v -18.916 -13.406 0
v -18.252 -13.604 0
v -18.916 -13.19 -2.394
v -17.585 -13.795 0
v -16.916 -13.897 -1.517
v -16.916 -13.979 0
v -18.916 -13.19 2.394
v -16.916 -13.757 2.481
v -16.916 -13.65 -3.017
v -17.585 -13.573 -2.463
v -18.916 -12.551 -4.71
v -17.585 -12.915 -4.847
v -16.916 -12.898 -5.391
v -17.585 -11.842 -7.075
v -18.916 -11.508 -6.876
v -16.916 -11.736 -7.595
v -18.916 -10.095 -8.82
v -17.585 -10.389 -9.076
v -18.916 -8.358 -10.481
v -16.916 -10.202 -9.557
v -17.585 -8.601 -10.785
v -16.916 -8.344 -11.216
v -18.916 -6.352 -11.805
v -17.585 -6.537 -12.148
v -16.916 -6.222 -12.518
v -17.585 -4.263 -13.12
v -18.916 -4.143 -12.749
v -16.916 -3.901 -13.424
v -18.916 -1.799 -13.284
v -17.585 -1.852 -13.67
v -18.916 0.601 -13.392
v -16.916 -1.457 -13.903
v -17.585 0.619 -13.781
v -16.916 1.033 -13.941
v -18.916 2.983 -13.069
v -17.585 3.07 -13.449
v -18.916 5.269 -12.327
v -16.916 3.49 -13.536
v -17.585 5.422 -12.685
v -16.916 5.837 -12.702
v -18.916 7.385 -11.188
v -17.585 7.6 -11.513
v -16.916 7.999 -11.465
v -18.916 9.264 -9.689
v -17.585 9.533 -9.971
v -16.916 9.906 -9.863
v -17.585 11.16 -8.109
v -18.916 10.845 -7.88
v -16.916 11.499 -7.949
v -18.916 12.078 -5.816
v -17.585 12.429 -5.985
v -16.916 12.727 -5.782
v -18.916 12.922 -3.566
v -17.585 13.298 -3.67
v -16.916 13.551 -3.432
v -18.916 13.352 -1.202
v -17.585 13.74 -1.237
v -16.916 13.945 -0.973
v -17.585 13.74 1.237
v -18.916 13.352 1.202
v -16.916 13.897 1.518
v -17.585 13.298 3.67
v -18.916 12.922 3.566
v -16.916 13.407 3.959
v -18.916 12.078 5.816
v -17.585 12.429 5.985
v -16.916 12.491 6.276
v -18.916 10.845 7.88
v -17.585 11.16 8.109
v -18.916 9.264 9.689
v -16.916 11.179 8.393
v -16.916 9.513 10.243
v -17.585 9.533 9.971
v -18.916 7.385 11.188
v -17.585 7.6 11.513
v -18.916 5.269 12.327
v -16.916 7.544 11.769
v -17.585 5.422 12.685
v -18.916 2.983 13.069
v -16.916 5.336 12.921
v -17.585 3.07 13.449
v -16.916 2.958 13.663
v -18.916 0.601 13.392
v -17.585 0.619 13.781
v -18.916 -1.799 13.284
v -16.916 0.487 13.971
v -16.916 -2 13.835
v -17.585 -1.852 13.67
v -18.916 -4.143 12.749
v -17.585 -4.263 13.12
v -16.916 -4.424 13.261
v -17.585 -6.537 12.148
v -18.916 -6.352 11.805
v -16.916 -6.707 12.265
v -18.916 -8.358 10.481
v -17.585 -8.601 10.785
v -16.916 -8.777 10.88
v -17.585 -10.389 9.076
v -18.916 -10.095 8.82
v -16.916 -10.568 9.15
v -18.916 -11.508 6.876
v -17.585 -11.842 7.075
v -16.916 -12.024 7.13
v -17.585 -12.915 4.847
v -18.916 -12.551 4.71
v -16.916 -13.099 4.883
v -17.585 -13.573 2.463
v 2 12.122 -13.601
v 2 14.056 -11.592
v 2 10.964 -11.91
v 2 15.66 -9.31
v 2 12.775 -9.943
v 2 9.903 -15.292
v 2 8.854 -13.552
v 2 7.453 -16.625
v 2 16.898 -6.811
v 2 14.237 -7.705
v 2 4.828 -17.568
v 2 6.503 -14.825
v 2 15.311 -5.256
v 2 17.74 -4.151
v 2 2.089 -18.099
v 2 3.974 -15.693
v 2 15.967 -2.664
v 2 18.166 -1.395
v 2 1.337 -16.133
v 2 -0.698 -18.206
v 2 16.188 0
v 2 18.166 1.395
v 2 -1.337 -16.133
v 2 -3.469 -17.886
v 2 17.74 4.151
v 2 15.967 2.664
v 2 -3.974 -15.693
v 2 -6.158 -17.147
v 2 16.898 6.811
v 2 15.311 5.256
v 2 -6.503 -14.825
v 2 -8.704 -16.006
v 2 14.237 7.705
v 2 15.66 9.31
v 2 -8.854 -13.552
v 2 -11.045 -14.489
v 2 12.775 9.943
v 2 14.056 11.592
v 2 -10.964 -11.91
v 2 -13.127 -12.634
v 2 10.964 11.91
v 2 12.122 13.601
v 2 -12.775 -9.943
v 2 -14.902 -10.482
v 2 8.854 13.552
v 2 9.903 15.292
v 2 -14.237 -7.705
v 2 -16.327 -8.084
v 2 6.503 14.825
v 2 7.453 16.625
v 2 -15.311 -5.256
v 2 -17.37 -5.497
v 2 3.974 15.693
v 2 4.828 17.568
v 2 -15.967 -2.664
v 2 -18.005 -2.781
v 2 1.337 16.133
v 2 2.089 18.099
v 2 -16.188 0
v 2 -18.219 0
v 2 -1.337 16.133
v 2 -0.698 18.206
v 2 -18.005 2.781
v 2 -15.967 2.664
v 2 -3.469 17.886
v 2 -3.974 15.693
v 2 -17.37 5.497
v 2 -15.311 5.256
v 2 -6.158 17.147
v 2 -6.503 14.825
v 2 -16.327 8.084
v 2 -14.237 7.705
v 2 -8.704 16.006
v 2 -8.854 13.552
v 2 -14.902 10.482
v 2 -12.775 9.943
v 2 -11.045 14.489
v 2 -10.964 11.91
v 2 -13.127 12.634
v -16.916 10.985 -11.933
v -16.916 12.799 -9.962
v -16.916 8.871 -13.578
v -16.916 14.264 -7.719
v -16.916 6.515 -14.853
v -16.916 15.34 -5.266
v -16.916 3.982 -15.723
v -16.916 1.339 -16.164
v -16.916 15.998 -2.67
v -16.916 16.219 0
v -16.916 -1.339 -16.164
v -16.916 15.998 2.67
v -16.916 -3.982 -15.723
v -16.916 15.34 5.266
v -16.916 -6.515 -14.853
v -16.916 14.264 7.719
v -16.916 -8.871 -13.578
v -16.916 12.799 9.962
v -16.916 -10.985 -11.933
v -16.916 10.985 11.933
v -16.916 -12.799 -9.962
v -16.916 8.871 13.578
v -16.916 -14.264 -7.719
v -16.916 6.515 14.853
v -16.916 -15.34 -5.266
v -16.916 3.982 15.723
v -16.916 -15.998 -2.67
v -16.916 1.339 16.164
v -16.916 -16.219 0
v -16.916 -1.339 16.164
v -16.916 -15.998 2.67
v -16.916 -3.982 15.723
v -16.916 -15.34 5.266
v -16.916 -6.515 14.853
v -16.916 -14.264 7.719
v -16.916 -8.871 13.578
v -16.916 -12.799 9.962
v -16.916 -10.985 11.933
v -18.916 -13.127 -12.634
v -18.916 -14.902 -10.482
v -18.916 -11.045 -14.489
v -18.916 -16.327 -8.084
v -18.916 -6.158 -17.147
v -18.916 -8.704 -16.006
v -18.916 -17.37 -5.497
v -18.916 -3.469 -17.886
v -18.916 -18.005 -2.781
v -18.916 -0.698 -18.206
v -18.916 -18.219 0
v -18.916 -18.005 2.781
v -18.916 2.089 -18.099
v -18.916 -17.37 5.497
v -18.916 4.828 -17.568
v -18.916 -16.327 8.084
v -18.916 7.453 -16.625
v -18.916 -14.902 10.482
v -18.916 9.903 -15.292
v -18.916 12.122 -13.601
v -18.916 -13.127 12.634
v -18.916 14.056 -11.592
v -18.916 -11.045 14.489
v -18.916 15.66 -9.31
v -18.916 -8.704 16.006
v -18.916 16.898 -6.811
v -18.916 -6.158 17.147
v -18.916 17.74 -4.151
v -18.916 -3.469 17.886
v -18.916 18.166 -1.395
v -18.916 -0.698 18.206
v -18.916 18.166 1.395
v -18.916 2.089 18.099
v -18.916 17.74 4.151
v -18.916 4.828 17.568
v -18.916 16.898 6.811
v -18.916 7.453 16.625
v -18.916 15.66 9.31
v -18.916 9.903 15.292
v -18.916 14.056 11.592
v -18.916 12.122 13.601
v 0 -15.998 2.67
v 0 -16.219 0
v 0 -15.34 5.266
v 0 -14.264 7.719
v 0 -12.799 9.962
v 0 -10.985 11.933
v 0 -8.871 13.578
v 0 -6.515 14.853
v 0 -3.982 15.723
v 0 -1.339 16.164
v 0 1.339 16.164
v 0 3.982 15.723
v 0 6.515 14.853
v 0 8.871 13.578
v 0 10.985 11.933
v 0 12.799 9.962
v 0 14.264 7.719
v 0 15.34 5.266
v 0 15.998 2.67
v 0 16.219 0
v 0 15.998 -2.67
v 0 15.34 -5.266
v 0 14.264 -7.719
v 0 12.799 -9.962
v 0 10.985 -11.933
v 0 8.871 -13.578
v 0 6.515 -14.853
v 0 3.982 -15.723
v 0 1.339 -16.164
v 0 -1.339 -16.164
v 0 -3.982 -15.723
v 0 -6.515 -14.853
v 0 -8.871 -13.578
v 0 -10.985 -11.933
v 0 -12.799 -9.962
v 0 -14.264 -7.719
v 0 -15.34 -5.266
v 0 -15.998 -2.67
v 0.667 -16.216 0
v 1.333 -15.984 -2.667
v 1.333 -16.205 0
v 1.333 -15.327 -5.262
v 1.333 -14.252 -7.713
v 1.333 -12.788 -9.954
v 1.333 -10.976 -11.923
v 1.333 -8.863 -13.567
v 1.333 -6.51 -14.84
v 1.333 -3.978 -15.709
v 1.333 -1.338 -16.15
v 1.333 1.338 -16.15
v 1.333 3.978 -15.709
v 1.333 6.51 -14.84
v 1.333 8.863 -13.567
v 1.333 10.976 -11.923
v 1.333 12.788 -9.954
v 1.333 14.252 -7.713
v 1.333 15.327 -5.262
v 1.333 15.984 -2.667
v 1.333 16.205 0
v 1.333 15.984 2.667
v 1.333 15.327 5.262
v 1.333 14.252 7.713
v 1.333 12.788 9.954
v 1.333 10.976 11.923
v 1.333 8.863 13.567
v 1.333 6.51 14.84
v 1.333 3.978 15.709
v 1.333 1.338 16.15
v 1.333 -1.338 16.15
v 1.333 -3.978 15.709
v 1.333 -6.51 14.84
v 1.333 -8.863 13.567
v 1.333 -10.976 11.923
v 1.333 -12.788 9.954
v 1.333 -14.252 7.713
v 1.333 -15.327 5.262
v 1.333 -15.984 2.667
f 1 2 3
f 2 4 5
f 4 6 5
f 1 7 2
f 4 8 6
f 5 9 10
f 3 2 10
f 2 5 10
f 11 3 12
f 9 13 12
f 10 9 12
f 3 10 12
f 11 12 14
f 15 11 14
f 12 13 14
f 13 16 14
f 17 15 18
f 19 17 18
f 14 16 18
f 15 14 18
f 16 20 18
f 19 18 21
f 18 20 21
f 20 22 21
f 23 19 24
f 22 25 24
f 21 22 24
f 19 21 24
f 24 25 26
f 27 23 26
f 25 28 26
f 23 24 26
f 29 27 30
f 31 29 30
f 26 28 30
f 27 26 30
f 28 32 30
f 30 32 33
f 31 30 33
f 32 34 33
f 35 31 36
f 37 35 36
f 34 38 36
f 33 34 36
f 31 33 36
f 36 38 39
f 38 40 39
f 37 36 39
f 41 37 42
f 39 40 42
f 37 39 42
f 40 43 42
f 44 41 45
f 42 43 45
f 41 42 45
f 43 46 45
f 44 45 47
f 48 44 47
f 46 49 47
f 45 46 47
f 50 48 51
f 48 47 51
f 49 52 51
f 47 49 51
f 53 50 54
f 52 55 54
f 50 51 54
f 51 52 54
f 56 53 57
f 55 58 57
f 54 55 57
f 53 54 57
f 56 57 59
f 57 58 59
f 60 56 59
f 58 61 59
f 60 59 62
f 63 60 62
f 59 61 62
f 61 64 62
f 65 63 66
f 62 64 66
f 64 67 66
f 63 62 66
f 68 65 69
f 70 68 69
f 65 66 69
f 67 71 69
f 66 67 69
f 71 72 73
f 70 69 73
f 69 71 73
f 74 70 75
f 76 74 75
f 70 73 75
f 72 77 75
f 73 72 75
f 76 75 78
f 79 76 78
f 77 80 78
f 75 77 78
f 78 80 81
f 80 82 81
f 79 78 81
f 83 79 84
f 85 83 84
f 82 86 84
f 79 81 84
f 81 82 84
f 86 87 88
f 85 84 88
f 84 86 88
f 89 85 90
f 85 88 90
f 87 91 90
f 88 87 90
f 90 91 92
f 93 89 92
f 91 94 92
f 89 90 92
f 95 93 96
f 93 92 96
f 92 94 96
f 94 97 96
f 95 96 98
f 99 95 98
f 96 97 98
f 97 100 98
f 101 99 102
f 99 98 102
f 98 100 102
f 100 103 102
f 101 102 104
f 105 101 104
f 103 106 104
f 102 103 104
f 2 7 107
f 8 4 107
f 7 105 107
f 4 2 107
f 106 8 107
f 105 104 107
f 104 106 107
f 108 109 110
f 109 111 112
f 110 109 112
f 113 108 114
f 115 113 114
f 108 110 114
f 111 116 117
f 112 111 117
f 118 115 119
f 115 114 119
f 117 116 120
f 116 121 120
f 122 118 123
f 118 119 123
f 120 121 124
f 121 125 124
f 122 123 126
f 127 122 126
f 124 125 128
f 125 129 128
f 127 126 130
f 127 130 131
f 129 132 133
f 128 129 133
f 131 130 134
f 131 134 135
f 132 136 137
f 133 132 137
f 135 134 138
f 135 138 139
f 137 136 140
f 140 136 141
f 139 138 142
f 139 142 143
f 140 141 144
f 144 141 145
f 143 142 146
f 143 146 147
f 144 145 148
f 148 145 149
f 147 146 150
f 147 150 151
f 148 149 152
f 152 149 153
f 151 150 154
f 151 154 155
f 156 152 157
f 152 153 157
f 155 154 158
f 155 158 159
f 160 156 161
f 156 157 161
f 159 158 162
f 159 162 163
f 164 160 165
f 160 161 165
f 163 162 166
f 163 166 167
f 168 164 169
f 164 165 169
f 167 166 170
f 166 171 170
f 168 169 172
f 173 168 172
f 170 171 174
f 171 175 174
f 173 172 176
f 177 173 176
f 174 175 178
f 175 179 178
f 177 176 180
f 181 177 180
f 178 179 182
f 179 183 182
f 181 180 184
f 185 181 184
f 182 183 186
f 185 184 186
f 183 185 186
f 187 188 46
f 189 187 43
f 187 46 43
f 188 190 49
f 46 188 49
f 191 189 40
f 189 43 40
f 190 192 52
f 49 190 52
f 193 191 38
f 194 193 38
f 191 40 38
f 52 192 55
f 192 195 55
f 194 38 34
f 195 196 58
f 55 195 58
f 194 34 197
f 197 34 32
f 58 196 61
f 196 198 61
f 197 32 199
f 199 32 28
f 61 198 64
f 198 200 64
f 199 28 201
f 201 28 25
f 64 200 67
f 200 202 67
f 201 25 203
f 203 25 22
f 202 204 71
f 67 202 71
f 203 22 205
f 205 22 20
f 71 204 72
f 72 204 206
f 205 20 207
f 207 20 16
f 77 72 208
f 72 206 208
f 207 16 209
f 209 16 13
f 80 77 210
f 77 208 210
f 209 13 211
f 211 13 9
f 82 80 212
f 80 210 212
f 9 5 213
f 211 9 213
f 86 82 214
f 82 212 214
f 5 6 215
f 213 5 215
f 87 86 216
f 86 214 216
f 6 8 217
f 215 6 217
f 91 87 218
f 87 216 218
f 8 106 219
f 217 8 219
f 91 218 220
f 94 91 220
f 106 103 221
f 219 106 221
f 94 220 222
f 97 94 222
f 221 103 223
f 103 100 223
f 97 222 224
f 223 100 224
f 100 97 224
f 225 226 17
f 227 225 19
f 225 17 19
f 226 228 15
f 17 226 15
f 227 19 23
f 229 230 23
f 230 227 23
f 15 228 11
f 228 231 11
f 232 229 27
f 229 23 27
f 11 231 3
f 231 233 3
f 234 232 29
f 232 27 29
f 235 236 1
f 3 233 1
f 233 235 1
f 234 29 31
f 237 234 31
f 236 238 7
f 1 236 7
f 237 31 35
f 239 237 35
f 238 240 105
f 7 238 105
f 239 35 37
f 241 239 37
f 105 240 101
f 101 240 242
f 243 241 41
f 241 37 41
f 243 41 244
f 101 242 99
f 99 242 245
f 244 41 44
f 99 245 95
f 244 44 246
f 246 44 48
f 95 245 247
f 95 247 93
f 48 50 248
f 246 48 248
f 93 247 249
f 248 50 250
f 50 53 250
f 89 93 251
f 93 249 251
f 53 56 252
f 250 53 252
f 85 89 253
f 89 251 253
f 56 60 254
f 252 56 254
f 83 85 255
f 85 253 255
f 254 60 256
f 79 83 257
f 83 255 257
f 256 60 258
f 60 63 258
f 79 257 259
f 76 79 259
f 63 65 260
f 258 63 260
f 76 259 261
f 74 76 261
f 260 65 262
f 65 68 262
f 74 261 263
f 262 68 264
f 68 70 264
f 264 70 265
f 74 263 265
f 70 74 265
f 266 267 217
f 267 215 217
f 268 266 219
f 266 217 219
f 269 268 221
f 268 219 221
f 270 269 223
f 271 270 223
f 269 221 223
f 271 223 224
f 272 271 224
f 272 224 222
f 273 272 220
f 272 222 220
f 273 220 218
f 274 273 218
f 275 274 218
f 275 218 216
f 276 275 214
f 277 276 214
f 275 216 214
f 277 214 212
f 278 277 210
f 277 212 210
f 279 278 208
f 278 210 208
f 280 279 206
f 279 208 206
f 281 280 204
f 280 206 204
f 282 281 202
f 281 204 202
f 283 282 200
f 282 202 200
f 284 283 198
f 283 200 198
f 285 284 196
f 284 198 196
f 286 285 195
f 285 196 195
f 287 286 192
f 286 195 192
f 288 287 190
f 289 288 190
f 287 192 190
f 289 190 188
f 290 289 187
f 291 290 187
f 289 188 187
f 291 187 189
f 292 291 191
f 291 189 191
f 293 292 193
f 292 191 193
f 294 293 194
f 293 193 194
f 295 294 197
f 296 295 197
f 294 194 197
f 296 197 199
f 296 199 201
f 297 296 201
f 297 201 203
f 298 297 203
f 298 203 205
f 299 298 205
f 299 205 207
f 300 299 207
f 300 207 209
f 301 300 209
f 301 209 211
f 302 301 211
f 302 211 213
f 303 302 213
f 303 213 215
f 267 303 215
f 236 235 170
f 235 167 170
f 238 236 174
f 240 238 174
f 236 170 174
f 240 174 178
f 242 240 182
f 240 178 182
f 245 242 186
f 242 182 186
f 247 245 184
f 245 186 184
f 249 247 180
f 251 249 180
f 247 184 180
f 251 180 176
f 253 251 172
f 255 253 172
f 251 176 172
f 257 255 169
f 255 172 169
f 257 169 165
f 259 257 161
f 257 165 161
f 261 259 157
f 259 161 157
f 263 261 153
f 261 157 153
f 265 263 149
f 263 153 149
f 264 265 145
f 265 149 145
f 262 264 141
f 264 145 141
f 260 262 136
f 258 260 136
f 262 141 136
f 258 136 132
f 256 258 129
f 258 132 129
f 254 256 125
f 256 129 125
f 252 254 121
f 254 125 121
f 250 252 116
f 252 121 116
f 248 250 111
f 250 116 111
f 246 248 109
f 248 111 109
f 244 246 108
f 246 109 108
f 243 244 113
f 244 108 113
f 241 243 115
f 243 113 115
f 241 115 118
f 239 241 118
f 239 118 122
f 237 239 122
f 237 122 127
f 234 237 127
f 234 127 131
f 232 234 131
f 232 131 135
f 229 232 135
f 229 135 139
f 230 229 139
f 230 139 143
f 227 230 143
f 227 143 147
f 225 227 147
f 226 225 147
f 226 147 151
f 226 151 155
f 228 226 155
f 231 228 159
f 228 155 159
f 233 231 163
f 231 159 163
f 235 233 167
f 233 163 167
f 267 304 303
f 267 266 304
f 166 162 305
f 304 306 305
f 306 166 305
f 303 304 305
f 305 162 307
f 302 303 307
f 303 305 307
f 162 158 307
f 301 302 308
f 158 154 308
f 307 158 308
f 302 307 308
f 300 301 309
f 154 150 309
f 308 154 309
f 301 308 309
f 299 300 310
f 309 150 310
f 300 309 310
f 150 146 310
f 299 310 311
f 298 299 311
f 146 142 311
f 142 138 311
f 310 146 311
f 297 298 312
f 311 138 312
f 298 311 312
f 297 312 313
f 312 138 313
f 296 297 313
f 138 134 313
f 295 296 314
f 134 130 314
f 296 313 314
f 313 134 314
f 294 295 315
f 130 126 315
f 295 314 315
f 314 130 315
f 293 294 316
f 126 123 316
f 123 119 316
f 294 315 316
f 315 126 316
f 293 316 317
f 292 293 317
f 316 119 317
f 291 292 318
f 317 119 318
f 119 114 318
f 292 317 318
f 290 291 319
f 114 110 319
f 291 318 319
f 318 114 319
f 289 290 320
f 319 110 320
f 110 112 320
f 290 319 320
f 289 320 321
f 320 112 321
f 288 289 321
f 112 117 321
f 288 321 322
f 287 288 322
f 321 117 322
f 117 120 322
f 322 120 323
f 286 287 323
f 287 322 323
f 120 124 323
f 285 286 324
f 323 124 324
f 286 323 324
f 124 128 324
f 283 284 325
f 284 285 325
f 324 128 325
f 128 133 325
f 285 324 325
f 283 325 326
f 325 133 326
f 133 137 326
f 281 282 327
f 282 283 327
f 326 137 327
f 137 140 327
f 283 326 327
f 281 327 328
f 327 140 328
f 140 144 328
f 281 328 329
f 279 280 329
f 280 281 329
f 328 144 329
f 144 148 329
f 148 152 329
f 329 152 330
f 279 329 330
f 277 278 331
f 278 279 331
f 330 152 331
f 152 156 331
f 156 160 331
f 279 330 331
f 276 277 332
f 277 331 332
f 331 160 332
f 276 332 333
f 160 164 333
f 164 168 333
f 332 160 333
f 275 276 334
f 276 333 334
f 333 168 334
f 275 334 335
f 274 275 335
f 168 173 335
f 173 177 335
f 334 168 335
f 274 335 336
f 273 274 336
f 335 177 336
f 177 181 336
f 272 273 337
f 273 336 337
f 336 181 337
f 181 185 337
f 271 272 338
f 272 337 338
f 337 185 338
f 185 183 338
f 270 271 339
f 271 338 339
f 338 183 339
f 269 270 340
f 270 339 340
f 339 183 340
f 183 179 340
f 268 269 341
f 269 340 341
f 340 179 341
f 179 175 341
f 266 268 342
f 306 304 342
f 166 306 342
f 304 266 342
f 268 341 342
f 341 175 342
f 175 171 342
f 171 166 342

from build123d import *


with BuildPart() as part:
    # Sketch2 → Revolve1 (revolve)
    with BuildSketch(Plane.XY):
        Polygon((-18.916428128, 0), (-18.916428128, -13.404553802), (-18.916428128, -18.218989764), (0, -18.218989764), (2, -18.218989764), (2, 0), (0, 0), (0, -16.217989764), (0, -16.218989764), (-16.916428128, -16.218989764), (-16.916428128, 0), align=None)
    revolve(axis=Axis((-16.916428128, 0, 0), (-1, 0, 0)))

    # Sketch5 → Cut-Revolve2 (revolve, cut)
    with BuildSketch(Plane.XY):
        with BuildLine():
            Line((-18.916428128, 0), (-18.916428128, -13.404553802))
            Line((-18.916428128, -13.404553802), (-18.916428128, -13.405553802))
            ThreePointArc((-18.916428128, -13.405553802), (-8.571883314, -15.651301661), (2, -16.188213247))
            Line((2, -16.188213247), (2, 0))
            Line((2, 0), (-18.916428128, 0))
        make_face()
    revolve(axis=Axis((-18.916428128, 0, 0), (1, 0, 0)), mode=Mode.SUBTRACT)


solid = part.part
